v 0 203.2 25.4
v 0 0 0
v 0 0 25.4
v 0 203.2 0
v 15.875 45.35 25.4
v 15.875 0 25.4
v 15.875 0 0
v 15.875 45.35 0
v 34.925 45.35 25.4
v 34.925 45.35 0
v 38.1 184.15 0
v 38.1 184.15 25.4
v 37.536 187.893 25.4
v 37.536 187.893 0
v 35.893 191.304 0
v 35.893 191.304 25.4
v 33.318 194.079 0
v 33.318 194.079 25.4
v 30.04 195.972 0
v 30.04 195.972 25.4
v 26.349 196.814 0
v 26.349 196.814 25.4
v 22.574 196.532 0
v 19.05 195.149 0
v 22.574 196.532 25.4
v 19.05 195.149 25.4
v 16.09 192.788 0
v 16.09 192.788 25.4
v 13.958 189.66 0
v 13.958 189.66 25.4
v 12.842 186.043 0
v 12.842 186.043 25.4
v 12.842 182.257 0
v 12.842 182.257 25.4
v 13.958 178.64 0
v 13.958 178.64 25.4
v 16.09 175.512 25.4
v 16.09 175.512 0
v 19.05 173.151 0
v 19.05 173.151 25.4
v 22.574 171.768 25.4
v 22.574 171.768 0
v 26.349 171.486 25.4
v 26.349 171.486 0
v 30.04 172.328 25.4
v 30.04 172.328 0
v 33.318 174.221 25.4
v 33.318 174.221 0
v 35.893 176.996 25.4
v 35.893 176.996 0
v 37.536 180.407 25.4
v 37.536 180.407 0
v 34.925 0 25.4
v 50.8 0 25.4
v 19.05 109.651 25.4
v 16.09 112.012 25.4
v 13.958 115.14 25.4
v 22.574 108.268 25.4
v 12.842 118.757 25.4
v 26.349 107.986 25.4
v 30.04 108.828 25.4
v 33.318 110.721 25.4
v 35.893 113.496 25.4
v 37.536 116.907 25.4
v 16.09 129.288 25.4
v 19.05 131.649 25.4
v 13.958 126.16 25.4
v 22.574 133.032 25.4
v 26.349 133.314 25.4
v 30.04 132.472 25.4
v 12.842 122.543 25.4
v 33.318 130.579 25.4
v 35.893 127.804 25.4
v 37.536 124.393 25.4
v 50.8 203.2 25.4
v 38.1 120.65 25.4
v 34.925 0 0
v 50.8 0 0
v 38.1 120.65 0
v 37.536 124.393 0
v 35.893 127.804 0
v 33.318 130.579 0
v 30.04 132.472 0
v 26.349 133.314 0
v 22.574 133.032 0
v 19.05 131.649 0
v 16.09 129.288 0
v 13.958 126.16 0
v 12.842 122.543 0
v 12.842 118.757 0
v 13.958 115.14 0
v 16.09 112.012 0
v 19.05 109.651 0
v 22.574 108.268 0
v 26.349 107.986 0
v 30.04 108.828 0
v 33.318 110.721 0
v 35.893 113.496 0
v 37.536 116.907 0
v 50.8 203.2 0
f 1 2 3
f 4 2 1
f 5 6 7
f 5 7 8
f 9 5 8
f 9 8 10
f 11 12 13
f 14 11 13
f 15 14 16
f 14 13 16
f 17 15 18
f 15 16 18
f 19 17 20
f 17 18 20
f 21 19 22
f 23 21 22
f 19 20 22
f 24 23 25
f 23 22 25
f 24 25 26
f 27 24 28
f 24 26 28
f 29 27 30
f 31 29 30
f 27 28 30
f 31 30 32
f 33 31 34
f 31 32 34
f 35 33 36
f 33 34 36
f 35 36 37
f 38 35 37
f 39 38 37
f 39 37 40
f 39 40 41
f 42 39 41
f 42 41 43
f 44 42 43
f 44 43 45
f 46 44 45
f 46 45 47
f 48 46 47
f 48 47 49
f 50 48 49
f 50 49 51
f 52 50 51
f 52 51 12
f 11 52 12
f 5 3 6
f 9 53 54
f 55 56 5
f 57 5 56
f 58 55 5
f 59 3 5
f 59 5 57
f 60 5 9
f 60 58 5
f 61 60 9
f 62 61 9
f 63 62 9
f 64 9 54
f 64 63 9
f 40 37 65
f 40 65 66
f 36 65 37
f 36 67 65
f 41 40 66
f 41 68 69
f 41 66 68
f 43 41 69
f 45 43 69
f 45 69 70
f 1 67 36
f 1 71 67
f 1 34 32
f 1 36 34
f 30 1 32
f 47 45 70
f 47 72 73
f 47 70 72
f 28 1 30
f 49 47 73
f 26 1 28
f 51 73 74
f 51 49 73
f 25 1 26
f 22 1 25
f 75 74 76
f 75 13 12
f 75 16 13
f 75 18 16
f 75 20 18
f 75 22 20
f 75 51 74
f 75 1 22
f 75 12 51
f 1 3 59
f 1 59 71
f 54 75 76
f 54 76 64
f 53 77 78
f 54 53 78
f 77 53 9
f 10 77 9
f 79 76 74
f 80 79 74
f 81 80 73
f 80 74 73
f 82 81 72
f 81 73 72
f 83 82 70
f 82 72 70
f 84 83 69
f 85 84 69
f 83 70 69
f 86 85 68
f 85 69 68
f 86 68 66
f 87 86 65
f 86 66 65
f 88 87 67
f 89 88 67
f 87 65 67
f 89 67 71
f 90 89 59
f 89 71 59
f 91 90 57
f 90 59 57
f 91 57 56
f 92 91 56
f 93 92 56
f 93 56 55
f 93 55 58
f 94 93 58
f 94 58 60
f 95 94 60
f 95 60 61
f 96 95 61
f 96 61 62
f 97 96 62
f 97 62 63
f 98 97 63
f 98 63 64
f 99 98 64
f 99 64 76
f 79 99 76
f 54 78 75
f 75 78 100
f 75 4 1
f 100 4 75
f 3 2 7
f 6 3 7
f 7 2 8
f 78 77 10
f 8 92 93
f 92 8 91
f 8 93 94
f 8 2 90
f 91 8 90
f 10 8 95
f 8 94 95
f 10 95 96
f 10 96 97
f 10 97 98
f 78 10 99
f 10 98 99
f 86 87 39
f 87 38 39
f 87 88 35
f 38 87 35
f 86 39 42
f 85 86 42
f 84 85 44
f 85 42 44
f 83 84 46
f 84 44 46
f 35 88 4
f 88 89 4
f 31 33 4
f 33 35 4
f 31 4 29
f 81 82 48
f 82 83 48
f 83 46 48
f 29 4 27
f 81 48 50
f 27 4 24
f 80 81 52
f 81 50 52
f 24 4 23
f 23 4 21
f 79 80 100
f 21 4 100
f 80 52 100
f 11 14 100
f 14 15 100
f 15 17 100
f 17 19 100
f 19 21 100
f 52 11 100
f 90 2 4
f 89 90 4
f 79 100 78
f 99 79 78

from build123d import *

# Parameters (mm, degrees)
SKETCH1_W               = 50.8
SKETCH1_H               = 203.2
BOSS_EXTRUDE1_DEPTH     = 25.4
SKETCH2_R               = 12.7
CUT_EXTRUDE1_DEPTH      = 1
CUT_EXTRUDE1_DEPTH_BACK = 26.4
SKETCH3_R               = 6.35
CUT_EXTRUDE2_DEPTH      = 26.4
SKETCH4_W               = 19.05
SKETCH4_H               = 45.349823228
CUT_EXTRUDE3_DEPTH      = 26.4


with BuildPart() as part:
    # Sketch1 → Boss-Extrude1 (new body)
    with BuildSketch(Plane.XY):
        with Locations((25.4, 101.6)):
            Rectangle(SKETCH1_W, SKETCH1_H)
    extrude(amount=BOSS_EXTRUDE1_DEPTH)

    # Sketch2 → Cut-Extrude1 (cut, two sides)
    with BuildSketch(Plane.XY.offset(25.4)) as cut_extrude1_sk:
        with Locations((25.4, 184.15)):
            Circle(SKETCH2_R)
        with Locations((25.4, 120.65)):
            Circle(SKETCH2_R)
    extrude(amount=CUT_EXTRUDE1_DEPTH, mode=Mode.SUBTRACT)
    extrude(cut_extrude1_sk.sketch, amount=-CUT_EXTRUDE1_DEPTH_BACK, mode=Mode.SUBTRACT)

    # Sketch3 → Cut-Extrude2 (cut, through all)
    with BuildSketch(Plane.XY.offset(25.4)):
        with Locations((25.4, 25.4)):
            Circle(SKETCH3_R)
    extrude(amount=-CUT_EXTRUDE2_DEPTH, mode=Mode.SUBTRACT)

    # Sketch4 → Cut-Extrude3 (cut, through all)
    with BuildSketch(Plane.XY.offset(25.4)):
        with Locations((25.4, 22.674911614)):
            Rectangle(SKETCH4_W, SKETCH4_H)
    extrude(amount=-CUT_EXTRUDE3_DEPTH, mode=Mode.SUBTRACT)


solid = part.part
